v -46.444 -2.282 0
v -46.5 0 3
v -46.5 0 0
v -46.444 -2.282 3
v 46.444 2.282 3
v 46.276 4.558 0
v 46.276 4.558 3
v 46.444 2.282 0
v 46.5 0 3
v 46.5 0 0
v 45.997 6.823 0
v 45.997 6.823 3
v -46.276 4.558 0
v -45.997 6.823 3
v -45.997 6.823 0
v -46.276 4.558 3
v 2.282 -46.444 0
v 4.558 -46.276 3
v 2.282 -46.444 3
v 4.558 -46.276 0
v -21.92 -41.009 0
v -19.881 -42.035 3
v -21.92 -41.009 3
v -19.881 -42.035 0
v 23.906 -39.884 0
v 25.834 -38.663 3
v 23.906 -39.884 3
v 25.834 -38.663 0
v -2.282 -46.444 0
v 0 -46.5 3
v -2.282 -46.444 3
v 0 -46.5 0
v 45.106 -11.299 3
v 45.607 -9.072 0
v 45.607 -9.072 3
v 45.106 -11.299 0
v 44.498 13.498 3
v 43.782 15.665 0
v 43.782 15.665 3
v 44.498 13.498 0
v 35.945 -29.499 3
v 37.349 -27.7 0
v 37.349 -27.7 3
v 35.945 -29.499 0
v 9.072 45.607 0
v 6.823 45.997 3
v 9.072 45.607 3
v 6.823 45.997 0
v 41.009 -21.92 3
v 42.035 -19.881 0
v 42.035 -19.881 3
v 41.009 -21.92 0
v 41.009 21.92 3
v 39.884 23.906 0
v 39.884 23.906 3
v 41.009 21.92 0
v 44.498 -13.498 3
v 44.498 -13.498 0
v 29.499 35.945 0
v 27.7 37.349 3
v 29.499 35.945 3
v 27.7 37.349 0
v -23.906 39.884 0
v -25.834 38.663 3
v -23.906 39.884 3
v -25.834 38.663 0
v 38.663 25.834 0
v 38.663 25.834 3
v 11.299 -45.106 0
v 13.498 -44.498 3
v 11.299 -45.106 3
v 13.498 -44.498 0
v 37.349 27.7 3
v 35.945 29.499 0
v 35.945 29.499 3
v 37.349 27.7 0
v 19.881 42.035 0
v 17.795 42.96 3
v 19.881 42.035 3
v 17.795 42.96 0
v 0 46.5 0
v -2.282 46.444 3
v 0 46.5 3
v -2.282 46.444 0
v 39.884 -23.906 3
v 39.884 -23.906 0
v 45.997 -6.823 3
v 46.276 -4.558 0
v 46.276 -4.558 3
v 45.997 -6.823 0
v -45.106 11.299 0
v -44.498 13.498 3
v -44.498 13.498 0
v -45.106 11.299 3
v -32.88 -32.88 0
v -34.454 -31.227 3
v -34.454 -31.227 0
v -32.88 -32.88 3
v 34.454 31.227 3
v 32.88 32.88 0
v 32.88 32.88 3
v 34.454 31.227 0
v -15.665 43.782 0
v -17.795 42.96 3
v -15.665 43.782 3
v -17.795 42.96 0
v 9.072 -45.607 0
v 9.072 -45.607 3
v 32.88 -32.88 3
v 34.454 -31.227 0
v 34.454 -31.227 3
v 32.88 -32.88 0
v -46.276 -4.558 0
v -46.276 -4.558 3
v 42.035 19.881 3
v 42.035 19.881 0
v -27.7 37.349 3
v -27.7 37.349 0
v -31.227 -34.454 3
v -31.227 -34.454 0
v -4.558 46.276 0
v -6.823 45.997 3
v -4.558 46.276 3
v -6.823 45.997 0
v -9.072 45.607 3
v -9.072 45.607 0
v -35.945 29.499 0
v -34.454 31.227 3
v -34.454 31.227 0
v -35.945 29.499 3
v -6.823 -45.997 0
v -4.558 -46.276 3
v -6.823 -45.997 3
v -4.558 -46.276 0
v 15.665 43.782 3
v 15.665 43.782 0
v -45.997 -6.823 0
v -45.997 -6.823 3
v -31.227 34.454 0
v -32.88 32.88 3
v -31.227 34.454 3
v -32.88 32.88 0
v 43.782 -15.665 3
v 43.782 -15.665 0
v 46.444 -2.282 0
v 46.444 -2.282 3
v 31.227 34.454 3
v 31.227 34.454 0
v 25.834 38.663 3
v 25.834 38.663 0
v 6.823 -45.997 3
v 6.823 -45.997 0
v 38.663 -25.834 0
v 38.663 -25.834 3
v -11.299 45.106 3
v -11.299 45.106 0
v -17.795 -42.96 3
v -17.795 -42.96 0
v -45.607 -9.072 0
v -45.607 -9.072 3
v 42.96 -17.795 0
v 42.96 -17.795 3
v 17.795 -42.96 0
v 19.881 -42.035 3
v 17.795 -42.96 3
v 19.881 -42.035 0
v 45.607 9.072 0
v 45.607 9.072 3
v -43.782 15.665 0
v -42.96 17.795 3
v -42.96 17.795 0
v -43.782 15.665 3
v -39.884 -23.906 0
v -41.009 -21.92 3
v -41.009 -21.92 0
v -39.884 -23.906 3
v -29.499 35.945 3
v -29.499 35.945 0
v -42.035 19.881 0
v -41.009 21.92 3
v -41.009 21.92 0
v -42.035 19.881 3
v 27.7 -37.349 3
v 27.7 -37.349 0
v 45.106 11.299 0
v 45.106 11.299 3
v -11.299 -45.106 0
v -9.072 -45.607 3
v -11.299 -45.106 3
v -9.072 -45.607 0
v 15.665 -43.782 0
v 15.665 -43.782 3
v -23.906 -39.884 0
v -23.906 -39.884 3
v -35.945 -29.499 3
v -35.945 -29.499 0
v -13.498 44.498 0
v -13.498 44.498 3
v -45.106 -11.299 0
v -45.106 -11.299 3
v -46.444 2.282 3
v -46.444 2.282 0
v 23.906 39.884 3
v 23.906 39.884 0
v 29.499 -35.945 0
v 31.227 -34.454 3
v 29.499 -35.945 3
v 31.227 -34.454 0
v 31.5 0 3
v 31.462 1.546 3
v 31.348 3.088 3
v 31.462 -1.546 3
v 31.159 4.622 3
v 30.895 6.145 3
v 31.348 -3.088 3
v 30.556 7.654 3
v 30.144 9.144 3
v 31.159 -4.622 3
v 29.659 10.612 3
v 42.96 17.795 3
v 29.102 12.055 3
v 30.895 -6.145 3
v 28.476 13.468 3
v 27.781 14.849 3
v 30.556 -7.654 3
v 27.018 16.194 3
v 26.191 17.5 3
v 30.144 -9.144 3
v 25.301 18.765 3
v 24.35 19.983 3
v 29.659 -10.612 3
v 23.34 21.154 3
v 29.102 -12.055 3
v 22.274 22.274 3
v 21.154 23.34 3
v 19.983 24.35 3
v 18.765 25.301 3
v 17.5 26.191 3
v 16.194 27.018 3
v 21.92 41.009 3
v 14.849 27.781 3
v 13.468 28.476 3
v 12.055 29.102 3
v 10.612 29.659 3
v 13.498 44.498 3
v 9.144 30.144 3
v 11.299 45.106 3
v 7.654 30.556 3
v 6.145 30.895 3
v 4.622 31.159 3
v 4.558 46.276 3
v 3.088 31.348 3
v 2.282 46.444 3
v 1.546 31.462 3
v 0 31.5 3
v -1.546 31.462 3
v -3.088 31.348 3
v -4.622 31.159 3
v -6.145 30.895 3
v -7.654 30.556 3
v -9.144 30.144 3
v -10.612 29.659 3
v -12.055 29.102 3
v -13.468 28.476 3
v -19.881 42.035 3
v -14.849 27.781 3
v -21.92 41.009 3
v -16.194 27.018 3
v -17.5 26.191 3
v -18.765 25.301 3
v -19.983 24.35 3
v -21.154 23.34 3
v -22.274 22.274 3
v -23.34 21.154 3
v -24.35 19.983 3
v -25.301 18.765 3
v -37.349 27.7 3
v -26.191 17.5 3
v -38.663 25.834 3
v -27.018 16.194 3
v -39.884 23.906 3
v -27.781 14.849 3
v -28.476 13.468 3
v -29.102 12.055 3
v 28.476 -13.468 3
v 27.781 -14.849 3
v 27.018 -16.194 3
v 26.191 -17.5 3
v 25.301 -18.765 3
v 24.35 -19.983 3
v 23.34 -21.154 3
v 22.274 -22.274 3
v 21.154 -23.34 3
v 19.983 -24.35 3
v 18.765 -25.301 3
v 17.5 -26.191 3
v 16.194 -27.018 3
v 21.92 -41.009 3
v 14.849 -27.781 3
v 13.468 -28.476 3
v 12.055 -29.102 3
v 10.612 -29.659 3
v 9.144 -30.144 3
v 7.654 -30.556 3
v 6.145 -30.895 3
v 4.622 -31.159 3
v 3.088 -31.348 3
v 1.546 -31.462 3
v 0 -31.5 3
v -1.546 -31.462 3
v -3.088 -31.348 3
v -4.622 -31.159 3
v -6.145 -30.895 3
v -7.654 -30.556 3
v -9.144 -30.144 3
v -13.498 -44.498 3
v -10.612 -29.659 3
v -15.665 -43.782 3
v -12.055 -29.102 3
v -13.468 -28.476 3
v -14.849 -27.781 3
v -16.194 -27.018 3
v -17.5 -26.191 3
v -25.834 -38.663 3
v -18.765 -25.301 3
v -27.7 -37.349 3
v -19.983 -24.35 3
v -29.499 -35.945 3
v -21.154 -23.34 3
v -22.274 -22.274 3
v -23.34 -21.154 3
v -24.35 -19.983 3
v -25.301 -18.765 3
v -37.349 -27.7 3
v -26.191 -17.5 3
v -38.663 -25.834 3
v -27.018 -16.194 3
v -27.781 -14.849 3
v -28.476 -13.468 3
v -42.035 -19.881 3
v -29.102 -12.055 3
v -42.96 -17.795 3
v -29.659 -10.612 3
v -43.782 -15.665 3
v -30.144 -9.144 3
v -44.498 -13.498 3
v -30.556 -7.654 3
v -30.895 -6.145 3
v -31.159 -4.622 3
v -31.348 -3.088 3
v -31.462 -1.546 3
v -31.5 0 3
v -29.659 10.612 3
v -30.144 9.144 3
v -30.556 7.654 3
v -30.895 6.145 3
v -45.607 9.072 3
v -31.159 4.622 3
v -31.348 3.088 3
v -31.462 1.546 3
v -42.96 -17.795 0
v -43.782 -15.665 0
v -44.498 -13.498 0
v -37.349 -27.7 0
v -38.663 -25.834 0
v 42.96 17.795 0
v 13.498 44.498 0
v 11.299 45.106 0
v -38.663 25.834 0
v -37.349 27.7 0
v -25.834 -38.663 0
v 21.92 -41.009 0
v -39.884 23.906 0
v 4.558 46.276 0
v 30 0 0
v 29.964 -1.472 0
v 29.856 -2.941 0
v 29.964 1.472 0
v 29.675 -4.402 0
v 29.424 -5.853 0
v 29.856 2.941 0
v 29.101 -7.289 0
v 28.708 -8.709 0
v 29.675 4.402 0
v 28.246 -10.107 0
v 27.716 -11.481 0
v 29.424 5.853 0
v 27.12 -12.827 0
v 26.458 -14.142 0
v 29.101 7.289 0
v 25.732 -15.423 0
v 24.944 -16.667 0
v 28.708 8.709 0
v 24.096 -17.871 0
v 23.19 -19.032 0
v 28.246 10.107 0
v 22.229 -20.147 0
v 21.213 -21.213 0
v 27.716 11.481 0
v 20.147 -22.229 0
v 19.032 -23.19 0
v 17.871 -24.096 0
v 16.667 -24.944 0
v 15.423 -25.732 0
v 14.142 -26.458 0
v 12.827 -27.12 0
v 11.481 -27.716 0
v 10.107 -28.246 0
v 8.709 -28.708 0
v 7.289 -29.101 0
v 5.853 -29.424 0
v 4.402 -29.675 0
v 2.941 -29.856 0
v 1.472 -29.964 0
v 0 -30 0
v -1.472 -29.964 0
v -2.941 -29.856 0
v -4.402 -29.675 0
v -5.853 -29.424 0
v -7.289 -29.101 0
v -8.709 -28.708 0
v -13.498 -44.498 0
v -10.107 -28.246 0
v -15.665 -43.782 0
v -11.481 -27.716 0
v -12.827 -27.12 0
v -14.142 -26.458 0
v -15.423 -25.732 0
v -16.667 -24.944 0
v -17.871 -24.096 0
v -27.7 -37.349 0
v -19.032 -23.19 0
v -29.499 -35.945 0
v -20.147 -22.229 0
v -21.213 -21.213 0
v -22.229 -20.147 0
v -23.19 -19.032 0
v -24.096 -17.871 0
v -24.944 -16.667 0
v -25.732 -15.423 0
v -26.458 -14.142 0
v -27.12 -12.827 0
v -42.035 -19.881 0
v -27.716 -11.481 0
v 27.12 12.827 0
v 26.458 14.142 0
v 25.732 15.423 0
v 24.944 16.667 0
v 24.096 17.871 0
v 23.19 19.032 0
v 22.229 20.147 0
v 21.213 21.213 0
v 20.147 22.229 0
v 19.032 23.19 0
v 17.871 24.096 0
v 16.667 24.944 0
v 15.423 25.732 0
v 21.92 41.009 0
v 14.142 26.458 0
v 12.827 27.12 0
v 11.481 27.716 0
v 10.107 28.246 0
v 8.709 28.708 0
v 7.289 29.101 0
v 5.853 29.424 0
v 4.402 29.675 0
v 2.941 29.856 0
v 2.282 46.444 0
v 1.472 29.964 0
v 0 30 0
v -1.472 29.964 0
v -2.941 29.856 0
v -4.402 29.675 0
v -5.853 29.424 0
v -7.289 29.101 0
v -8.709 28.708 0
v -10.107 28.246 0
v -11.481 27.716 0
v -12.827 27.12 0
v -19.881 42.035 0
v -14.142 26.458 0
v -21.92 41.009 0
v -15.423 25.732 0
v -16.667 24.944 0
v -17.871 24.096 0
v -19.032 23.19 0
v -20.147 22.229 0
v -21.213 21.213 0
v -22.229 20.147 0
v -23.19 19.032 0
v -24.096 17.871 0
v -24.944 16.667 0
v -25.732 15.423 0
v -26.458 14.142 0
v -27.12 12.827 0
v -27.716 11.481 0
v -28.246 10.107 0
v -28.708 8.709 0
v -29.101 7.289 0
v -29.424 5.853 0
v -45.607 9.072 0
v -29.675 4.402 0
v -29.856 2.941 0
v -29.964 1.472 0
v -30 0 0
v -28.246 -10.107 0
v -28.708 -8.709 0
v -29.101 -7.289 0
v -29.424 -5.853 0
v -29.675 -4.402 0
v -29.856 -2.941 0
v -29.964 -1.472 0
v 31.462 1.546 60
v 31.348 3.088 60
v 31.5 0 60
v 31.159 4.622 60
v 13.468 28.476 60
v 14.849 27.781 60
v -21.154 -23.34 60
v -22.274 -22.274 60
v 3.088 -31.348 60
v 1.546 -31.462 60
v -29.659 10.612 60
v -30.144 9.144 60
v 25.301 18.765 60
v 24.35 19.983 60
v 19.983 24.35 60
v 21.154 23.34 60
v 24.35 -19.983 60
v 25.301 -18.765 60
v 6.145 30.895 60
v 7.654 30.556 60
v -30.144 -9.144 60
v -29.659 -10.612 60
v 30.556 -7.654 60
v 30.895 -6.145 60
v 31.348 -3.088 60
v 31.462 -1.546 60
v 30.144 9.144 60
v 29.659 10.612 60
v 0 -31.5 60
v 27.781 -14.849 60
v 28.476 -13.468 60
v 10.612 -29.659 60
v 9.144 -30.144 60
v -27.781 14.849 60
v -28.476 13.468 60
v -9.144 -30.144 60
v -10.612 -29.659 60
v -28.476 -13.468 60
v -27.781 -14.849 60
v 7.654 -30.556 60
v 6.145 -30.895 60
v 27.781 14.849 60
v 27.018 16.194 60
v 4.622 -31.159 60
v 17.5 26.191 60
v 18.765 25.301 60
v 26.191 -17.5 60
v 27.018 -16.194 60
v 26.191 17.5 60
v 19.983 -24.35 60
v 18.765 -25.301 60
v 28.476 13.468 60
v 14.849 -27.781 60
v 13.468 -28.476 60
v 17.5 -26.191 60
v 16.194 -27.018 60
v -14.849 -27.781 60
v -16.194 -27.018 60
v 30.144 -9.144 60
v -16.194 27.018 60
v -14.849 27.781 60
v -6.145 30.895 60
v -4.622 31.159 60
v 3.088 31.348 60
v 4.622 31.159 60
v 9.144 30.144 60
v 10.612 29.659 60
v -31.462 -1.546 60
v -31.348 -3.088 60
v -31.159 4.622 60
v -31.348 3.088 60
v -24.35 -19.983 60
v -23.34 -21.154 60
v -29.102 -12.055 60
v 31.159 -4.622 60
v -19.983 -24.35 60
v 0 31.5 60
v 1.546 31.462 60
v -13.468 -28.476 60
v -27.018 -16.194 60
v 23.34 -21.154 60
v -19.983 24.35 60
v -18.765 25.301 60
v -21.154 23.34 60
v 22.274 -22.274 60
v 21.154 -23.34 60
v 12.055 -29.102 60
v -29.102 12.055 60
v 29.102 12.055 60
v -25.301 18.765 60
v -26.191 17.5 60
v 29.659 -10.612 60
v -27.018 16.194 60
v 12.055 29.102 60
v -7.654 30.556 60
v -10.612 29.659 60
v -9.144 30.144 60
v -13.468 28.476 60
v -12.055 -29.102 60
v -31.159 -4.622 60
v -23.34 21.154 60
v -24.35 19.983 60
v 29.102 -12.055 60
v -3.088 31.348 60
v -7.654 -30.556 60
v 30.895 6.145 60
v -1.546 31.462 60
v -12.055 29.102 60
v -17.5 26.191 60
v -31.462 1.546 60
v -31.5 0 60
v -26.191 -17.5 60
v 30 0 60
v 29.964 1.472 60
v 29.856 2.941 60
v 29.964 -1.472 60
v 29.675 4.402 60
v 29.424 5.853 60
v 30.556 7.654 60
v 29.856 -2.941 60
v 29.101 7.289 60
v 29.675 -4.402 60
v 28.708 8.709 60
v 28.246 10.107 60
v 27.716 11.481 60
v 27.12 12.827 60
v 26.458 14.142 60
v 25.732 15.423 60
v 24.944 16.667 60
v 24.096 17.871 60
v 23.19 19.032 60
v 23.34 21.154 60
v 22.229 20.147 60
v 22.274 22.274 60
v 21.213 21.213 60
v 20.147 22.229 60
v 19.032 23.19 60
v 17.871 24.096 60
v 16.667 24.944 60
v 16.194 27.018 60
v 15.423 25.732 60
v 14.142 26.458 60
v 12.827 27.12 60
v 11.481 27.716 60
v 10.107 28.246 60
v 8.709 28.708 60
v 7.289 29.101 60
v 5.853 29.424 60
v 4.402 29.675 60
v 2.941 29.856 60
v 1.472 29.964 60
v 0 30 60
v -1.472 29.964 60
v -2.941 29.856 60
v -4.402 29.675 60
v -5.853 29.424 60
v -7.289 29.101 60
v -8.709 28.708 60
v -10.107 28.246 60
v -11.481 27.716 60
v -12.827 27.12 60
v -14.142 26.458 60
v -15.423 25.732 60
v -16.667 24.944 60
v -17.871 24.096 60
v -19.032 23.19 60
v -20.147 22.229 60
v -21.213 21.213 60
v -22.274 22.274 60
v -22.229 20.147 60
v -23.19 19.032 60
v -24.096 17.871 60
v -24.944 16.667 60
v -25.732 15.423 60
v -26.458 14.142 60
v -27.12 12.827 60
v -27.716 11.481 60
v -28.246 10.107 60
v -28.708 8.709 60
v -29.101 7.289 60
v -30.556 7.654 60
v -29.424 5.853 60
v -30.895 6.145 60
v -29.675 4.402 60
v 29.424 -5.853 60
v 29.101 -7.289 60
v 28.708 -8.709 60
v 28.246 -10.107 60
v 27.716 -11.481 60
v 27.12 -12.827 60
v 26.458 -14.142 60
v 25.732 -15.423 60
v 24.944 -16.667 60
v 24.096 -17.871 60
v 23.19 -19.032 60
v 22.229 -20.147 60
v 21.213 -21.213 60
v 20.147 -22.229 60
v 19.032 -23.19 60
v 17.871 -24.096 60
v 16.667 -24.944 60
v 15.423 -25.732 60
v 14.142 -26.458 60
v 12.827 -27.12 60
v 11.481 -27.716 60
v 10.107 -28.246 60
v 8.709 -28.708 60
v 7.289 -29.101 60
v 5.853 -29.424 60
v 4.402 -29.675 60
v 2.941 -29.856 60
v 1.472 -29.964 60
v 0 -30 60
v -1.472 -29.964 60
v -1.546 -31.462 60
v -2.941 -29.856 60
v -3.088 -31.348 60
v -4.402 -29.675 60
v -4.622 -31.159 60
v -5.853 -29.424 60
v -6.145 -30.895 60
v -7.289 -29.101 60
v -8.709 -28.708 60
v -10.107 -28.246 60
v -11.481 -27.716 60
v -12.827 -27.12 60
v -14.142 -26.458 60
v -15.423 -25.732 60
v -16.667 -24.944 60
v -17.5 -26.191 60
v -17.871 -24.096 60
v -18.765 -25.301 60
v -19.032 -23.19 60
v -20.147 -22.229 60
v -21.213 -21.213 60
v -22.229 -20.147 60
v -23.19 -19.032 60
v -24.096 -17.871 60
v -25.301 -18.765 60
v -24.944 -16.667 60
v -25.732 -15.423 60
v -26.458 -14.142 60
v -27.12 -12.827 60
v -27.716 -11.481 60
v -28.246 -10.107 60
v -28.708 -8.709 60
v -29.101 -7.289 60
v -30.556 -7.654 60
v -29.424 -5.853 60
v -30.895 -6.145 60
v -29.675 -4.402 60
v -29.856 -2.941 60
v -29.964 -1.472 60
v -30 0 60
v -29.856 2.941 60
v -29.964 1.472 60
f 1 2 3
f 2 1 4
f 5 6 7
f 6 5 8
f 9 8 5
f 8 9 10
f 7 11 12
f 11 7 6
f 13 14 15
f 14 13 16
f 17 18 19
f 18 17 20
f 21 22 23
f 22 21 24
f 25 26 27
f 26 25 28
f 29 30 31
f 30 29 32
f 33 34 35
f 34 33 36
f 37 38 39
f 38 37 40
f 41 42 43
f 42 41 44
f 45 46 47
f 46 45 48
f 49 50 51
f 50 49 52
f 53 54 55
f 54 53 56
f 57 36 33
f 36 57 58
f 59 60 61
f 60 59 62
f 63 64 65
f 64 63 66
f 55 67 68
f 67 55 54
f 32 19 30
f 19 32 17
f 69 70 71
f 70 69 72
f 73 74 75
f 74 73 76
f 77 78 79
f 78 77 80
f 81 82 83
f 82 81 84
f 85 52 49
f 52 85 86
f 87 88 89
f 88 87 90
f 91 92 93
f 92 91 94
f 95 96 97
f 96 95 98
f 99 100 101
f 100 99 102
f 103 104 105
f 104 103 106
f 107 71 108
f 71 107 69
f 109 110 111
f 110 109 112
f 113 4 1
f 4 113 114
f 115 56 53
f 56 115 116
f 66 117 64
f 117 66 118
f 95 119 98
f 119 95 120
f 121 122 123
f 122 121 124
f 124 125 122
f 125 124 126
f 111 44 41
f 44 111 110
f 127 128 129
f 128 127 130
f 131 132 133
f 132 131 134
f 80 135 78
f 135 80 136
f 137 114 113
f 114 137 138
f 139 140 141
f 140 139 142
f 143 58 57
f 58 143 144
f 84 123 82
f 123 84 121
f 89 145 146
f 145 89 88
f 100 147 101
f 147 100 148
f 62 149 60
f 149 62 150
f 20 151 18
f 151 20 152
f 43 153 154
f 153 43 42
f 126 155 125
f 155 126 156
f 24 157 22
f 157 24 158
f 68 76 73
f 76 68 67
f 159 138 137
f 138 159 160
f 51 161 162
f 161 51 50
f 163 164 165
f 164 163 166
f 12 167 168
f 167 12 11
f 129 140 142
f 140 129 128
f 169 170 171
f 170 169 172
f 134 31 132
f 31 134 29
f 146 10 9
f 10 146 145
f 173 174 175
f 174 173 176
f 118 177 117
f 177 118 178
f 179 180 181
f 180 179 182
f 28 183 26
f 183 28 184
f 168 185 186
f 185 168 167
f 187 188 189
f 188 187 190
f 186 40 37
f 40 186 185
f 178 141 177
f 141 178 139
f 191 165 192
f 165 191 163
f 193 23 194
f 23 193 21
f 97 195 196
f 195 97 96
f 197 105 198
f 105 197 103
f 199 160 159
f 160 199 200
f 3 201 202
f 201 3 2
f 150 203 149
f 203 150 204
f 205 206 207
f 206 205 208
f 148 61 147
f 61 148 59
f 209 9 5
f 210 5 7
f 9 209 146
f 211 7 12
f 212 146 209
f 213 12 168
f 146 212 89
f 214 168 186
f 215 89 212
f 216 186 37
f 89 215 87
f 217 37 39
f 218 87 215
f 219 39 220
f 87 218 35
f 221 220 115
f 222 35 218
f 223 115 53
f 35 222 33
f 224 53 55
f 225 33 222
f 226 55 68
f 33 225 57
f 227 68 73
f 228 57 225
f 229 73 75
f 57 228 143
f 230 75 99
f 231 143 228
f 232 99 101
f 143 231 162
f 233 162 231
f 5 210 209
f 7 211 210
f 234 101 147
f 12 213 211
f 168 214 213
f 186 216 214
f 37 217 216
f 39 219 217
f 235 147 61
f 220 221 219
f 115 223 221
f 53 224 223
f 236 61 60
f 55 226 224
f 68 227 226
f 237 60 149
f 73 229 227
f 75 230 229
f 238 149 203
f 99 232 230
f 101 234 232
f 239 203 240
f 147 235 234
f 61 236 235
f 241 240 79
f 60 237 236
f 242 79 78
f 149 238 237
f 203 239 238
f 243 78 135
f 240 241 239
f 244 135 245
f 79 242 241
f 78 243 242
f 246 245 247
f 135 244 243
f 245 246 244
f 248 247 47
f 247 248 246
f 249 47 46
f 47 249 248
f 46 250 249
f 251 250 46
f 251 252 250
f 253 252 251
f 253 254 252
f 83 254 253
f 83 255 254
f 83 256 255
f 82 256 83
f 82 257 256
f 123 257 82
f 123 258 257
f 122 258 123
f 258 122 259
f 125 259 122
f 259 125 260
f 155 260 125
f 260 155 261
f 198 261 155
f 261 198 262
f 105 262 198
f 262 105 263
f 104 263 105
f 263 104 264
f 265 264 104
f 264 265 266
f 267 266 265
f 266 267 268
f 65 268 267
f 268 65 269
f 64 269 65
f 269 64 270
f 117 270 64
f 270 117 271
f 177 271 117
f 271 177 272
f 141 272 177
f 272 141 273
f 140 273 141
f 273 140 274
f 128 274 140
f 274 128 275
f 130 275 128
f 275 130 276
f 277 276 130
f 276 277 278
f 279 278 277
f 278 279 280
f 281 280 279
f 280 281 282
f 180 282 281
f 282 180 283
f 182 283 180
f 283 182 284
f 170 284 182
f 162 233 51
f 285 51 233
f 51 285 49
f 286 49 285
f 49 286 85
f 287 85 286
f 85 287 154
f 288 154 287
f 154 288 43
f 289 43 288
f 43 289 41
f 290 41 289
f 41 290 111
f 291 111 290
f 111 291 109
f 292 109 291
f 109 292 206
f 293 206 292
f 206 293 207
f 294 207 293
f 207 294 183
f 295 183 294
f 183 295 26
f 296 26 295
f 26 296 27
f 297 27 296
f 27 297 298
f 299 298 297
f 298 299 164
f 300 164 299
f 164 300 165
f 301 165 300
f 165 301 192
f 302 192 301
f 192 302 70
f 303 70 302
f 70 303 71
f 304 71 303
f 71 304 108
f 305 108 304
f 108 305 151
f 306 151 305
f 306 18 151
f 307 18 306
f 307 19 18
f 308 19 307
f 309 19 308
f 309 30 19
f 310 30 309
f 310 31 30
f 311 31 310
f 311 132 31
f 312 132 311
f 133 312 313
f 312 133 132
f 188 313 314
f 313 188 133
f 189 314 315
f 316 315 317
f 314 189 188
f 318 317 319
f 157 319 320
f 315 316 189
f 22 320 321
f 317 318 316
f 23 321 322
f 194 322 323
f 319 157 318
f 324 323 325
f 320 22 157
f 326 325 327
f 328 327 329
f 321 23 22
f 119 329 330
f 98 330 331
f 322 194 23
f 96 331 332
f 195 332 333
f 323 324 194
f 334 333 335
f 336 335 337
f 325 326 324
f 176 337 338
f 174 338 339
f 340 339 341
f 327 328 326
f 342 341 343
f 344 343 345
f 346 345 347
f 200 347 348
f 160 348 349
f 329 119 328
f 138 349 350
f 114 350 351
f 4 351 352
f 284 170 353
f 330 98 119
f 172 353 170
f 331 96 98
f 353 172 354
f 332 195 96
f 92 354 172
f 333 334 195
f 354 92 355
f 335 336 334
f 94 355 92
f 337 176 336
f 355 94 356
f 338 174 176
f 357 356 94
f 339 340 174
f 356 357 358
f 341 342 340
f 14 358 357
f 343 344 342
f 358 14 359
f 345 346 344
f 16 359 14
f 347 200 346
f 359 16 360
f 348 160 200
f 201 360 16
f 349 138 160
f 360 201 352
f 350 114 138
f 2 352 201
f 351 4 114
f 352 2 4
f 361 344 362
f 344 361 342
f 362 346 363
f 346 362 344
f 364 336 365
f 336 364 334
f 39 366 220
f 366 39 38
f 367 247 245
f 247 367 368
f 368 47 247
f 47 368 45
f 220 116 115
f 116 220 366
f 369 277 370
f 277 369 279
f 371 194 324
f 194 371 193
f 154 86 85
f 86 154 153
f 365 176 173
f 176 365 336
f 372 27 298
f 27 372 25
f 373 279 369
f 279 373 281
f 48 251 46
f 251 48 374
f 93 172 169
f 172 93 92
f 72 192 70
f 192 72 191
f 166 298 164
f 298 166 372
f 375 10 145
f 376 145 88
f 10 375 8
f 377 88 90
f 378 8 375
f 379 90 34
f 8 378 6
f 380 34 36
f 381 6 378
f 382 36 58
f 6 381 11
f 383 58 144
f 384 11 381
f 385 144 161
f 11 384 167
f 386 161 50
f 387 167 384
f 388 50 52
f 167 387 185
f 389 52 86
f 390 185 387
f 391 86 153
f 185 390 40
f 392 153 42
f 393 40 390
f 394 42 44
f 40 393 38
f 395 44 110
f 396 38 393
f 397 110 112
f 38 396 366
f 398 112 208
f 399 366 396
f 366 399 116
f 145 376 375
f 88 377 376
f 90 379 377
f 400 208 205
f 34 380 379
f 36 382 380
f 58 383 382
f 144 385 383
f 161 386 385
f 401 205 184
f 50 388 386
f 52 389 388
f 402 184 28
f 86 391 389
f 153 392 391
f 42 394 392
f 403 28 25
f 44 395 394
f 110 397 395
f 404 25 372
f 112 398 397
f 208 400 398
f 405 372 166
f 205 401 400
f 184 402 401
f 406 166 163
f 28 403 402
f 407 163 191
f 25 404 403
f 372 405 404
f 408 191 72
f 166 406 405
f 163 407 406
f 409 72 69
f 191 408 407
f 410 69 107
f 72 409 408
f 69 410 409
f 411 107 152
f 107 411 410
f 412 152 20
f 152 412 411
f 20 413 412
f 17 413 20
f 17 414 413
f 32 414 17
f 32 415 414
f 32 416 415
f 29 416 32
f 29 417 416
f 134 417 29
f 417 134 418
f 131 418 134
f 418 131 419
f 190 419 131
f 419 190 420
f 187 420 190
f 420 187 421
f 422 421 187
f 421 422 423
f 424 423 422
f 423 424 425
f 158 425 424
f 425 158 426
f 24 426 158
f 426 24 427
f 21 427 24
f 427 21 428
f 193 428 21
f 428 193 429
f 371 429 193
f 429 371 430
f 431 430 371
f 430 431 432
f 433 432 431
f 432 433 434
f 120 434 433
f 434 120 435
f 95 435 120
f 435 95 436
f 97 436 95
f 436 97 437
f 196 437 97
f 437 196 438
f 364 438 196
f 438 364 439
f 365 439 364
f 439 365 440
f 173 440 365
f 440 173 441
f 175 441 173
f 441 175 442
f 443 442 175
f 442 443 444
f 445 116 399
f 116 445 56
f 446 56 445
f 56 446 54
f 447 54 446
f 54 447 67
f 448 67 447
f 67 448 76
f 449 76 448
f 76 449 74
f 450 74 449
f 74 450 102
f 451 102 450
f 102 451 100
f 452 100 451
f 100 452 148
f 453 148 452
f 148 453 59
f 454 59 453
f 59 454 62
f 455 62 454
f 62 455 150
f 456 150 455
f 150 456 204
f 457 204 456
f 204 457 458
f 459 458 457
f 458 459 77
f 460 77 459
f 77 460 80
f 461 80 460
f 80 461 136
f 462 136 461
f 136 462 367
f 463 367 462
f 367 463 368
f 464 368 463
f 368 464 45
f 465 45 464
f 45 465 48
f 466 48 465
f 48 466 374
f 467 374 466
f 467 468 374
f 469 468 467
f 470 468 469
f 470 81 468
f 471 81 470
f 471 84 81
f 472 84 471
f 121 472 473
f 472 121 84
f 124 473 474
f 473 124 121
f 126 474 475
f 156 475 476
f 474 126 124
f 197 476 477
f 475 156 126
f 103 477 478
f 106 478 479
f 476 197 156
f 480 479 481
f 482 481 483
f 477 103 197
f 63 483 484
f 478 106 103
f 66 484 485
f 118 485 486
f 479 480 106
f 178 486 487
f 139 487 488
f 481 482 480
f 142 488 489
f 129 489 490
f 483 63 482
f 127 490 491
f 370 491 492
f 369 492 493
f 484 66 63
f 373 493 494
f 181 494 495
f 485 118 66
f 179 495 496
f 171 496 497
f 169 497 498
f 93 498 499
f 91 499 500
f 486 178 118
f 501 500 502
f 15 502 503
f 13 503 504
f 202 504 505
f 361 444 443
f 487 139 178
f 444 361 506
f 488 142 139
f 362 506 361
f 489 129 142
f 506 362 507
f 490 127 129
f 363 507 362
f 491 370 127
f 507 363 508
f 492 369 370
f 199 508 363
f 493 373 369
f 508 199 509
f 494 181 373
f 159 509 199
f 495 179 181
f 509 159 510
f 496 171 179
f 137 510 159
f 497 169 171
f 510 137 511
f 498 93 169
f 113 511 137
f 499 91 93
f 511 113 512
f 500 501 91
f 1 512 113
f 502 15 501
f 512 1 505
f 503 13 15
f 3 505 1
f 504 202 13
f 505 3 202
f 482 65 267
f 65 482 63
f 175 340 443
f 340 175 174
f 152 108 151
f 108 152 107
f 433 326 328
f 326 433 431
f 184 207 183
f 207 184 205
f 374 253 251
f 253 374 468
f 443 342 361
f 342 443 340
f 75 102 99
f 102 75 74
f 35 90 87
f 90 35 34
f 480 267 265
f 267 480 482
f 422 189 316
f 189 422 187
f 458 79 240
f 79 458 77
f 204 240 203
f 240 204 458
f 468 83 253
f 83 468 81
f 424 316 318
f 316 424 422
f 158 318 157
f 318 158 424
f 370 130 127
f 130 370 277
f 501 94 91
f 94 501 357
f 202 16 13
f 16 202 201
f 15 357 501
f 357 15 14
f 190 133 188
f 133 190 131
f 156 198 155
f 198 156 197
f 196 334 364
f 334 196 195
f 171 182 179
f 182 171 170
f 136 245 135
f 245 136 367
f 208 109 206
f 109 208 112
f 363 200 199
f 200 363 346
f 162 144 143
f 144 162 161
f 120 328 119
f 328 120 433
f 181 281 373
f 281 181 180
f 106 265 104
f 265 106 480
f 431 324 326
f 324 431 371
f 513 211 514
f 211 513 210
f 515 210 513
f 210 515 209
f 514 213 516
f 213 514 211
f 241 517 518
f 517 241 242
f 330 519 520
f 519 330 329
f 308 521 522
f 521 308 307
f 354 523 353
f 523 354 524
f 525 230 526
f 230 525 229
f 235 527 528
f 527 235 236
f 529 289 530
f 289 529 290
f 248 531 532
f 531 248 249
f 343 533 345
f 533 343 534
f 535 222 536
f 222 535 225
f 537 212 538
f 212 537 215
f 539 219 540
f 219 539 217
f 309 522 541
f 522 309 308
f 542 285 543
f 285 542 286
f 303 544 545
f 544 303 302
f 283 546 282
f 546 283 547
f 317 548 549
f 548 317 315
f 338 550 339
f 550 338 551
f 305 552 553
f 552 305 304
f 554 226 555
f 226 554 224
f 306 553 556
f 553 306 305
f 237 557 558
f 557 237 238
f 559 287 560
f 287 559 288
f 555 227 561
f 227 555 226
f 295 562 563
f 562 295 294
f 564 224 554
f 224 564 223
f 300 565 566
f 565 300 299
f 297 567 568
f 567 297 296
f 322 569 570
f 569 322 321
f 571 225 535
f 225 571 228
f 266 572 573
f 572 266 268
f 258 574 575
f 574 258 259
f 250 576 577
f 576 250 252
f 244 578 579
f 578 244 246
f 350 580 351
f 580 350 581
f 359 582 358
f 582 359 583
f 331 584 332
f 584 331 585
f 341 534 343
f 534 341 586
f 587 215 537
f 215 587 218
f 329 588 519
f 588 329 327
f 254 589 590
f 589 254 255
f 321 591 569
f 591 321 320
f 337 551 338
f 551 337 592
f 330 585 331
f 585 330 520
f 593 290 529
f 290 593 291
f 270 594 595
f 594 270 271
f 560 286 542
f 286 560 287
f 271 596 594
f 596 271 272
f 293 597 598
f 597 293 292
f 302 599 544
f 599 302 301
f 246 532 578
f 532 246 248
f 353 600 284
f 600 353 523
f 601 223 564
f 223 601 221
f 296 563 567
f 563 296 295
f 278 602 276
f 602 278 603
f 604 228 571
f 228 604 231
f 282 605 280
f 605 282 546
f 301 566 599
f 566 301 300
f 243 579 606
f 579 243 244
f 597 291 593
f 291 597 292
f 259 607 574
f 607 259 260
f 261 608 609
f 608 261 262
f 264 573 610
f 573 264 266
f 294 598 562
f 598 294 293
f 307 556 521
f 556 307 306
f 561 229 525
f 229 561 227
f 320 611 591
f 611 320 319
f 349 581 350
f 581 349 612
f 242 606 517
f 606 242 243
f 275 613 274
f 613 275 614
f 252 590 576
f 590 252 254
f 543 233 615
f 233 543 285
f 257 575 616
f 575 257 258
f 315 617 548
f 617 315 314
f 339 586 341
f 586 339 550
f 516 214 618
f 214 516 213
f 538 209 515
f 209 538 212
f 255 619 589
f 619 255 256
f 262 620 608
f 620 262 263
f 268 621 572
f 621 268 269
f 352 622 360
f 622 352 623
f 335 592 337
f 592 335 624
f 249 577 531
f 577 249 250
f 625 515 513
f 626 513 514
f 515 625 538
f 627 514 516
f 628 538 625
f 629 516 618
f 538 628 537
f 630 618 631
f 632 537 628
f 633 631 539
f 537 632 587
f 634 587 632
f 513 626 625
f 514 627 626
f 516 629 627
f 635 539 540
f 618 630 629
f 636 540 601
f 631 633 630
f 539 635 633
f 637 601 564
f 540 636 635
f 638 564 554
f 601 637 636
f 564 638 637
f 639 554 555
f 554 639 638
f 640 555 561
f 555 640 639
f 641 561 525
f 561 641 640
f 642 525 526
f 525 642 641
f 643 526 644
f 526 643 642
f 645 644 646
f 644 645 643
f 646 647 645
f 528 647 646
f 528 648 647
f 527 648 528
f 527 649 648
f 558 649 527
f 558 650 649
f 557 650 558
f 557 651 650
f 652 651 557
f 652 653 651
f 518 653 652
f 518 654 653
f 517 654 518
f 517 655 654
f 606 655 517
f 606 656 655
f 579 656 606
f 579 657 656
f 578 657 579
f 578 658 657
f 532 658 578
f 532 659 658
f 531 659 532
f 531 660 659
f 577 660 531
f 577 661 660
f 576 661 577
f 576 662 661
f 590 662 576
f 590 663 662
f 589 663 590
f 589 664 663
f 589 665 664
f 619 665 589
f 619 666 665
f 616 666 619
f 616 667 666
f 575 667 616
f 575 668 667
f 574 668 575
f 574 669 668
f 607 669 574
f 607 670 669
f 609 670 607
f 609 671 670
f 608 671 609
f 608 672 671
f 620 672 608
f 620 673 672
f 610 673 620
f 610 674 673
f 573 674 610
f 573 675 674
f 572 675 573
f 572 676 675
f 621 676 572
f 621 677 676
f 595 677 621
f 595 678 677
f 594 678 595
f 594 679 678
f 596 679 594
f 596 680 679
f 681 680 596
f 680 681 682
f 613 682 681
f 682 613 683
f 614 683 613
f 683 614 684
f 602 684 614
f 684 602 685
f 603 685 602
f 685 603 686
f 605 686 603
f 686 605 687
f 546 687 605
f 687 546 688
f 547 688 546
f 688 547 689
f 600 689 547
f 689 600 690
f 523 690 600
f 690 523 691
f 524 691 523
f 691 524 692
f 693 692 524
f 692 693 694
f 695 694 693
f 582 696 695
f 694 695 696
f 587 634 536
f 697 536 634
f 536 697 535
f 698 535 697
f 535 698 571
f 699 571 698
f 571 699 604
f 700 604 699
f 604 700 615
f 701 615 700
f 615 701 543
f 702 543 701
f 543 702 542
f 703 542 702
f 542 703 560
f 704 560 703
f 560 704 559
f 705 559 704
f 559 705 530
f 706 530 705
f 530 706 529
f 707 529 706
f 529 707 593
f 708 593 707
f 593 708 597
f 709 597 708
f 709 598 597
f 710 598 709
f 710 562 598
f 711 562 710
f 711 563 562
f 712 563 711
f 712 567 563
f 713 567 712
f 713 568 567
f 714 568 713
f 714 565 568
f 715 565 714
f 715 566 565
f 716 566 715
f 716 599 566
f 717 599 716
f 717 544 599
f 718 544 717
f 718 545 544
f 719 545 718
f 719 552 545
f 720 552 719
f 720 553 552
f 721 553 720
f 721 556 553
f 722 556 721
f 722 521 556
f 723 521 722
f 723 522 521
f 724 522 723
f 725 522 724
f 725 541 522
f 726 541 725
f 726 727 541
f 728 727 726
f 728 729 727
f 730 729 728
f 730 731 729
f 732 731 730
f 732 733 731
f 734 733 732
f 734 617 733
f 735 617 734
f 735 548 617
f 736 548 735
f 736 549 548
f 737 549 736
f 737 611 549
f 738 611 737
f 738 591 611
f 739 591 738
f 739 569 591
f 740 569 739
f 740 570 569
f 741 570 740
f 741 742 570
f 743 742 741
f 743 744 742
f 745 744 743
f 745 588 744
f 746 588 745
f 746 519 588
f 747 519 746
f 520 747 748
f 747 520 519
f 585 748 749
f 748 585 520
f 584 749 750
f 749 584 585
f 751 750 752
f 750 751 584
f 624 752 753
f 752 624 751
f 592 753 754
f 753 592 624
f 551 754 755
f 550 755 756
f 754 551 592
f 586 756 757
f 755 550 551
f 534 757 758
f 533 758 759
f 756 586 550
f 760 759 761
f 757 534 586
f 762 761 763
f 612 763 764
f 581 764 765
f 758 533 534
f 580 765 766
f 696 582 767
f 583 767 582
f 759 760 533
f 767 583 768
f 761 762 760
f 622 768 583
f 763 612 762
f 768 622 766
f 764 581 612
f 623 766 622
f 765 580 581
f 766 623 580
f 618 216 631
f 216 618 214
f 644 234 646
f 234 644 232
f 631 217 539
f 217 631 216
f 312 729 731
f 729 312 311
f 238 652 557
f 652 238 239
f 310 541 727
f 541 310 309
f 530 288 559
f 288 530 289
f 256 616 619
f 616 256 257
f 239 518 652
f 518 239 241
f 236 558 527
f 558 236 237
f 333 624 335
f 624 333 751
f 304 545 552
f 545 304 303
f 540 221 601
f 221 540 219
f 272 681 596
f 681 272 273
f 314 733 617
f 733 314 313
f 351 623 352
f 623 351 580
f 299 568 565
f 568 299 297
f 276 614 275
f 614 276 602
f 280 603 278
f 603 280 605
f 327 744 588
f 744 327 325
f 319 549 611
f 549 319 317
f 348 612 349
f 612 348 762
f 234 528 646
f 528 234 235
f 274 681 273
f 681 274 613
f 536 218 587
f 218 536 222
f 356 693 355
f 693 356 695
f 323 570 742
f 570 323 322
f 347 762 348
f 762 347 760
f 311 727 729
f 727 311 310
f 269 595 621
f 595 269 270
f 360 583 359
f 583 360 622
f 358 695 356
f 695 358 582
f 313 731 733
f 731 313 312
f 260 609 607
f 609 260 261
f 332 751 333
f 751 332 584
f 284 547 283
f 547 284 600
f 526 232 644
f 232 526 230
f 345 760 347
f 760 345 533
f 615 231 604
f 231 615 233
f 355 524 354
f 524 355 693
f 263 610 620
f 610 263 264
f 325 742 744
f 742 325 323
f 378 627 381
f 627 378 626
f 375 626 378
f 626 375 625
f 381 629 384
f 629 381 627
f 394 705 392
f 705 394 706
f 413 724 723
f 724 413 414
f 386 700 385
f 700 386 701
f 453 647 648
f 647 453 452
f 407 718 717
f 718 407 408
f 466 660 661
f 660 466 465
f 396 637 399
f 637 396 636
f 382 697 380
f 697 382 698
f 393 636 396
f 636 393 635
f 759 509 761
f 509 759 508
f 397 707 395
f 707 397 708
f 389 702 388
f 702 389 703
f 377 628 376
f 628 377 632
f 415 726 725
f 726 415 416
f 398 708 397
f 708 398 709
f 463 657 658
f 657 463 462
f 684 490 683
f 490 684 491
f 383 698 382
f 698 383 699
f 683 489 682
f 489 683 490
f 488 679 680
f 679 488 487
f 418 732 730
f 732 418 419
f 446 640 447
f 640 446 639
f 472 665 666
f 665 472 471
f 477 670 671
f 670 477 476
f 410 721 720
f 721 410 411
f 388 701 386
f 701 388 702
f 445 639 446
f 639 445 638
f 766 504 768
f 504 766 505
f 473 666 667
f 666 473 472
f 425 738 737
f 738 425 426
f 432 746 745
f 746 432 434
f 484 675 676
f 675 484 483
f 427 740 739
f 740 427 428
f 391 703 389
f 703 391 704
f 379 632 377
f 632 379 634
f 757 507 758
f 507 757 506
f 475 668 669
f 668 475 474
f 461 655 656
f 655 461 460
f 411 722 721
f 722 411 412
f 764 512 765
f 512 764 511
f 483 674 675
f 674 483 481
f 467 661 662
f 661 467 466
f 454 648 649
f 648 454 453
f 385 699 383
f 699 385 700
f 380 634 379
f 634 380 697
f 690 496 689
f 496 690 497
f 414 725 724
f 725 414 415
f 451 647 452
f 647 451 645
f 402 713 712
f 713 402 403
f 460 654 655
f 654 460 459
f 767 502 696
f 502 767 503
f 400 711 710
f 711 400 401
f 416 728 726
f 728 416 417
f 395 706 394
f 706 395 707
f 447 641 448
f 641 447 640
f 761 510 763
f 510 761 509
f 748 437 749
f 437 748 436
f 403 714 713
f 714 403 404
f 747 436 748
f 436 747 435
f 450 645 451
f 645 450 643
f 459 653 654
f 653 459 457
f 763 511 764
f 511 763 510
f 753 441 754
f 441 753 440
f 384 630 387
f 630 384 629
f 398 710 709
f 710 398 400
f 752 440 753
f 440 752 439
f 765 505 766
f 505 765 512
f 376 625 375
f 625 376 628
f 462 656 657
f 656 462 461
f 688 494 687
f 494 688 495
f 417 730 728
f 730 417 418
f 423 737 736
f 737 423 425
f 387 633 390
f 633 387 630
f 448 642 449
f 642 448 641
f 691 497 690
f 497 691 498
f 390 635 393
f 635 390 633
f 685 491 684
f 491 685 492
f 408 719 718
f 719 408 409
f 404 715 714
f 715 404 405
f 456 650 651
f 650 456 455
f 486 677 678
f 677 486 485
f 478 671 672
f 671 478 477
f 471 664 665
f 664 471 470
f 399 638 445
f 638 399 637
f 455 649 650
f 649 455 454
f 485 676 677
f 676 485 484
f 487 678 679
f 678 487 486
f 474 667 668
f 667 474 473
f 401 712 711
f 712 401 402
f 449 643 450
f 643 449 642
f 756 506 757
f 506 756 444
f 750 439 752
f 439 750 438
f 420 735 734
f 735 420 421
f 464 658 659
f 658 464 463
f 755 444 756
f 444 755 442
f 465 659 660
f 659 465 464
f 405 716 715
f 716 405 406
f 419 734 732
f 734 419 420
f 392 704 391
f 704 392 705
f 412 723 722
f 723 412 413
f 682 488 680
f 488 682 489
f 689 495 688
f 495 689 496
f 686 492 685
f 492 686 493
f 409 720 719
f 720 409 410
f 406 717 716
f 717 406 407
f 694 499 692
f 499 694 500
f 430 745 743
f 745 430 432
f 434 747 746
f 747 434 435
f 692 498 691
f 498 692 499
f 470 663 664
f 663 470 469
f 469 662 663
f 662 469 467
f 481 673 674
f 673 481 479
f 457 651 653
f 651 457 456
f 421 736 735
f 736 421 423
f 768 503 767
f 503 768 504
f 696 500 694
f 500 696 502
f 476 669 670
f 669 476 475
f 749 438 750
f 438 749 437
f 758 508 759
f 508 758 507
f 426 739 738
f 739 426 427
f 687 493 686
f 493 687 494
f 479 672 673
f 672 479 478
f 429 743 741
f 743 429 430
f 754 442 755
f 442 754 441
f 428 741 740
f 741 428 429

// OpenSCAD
//
// CylinderBaseWithCenterTube-1-20260426A.scad
//
// Cylinder base with center tube
//
// First version: 2026-04-27(Mon) 02:37 JST / 2026-04-26(Sun) 17:37 UTC 

D_base  = 93.0;  // 底面円柱の直径
H_base  = 3.0;   // 底面円柱の高さ

D_outer = 63.0;  // 中央円柱の外径
H_outer = 60.0;  // 中央円柱の高さ

D_hole  = 60.0;  // 中心穴の直径

EPS = 1.0;       // 安全マージン
$fn = 128;       // 円の滑らかさ

difference() {
    union() {
        // 底面円柱
        cylinder(d = D_base, h = H_base);

        // 中央に立つ円柱
        cylinder(d = D_outer, h = H_outer);
    }

    // 中心の貫通穴
    translate([0, 0, -EPS])
        cylinder(d = D_hole, h = H_outer + 2*EPS);
}
